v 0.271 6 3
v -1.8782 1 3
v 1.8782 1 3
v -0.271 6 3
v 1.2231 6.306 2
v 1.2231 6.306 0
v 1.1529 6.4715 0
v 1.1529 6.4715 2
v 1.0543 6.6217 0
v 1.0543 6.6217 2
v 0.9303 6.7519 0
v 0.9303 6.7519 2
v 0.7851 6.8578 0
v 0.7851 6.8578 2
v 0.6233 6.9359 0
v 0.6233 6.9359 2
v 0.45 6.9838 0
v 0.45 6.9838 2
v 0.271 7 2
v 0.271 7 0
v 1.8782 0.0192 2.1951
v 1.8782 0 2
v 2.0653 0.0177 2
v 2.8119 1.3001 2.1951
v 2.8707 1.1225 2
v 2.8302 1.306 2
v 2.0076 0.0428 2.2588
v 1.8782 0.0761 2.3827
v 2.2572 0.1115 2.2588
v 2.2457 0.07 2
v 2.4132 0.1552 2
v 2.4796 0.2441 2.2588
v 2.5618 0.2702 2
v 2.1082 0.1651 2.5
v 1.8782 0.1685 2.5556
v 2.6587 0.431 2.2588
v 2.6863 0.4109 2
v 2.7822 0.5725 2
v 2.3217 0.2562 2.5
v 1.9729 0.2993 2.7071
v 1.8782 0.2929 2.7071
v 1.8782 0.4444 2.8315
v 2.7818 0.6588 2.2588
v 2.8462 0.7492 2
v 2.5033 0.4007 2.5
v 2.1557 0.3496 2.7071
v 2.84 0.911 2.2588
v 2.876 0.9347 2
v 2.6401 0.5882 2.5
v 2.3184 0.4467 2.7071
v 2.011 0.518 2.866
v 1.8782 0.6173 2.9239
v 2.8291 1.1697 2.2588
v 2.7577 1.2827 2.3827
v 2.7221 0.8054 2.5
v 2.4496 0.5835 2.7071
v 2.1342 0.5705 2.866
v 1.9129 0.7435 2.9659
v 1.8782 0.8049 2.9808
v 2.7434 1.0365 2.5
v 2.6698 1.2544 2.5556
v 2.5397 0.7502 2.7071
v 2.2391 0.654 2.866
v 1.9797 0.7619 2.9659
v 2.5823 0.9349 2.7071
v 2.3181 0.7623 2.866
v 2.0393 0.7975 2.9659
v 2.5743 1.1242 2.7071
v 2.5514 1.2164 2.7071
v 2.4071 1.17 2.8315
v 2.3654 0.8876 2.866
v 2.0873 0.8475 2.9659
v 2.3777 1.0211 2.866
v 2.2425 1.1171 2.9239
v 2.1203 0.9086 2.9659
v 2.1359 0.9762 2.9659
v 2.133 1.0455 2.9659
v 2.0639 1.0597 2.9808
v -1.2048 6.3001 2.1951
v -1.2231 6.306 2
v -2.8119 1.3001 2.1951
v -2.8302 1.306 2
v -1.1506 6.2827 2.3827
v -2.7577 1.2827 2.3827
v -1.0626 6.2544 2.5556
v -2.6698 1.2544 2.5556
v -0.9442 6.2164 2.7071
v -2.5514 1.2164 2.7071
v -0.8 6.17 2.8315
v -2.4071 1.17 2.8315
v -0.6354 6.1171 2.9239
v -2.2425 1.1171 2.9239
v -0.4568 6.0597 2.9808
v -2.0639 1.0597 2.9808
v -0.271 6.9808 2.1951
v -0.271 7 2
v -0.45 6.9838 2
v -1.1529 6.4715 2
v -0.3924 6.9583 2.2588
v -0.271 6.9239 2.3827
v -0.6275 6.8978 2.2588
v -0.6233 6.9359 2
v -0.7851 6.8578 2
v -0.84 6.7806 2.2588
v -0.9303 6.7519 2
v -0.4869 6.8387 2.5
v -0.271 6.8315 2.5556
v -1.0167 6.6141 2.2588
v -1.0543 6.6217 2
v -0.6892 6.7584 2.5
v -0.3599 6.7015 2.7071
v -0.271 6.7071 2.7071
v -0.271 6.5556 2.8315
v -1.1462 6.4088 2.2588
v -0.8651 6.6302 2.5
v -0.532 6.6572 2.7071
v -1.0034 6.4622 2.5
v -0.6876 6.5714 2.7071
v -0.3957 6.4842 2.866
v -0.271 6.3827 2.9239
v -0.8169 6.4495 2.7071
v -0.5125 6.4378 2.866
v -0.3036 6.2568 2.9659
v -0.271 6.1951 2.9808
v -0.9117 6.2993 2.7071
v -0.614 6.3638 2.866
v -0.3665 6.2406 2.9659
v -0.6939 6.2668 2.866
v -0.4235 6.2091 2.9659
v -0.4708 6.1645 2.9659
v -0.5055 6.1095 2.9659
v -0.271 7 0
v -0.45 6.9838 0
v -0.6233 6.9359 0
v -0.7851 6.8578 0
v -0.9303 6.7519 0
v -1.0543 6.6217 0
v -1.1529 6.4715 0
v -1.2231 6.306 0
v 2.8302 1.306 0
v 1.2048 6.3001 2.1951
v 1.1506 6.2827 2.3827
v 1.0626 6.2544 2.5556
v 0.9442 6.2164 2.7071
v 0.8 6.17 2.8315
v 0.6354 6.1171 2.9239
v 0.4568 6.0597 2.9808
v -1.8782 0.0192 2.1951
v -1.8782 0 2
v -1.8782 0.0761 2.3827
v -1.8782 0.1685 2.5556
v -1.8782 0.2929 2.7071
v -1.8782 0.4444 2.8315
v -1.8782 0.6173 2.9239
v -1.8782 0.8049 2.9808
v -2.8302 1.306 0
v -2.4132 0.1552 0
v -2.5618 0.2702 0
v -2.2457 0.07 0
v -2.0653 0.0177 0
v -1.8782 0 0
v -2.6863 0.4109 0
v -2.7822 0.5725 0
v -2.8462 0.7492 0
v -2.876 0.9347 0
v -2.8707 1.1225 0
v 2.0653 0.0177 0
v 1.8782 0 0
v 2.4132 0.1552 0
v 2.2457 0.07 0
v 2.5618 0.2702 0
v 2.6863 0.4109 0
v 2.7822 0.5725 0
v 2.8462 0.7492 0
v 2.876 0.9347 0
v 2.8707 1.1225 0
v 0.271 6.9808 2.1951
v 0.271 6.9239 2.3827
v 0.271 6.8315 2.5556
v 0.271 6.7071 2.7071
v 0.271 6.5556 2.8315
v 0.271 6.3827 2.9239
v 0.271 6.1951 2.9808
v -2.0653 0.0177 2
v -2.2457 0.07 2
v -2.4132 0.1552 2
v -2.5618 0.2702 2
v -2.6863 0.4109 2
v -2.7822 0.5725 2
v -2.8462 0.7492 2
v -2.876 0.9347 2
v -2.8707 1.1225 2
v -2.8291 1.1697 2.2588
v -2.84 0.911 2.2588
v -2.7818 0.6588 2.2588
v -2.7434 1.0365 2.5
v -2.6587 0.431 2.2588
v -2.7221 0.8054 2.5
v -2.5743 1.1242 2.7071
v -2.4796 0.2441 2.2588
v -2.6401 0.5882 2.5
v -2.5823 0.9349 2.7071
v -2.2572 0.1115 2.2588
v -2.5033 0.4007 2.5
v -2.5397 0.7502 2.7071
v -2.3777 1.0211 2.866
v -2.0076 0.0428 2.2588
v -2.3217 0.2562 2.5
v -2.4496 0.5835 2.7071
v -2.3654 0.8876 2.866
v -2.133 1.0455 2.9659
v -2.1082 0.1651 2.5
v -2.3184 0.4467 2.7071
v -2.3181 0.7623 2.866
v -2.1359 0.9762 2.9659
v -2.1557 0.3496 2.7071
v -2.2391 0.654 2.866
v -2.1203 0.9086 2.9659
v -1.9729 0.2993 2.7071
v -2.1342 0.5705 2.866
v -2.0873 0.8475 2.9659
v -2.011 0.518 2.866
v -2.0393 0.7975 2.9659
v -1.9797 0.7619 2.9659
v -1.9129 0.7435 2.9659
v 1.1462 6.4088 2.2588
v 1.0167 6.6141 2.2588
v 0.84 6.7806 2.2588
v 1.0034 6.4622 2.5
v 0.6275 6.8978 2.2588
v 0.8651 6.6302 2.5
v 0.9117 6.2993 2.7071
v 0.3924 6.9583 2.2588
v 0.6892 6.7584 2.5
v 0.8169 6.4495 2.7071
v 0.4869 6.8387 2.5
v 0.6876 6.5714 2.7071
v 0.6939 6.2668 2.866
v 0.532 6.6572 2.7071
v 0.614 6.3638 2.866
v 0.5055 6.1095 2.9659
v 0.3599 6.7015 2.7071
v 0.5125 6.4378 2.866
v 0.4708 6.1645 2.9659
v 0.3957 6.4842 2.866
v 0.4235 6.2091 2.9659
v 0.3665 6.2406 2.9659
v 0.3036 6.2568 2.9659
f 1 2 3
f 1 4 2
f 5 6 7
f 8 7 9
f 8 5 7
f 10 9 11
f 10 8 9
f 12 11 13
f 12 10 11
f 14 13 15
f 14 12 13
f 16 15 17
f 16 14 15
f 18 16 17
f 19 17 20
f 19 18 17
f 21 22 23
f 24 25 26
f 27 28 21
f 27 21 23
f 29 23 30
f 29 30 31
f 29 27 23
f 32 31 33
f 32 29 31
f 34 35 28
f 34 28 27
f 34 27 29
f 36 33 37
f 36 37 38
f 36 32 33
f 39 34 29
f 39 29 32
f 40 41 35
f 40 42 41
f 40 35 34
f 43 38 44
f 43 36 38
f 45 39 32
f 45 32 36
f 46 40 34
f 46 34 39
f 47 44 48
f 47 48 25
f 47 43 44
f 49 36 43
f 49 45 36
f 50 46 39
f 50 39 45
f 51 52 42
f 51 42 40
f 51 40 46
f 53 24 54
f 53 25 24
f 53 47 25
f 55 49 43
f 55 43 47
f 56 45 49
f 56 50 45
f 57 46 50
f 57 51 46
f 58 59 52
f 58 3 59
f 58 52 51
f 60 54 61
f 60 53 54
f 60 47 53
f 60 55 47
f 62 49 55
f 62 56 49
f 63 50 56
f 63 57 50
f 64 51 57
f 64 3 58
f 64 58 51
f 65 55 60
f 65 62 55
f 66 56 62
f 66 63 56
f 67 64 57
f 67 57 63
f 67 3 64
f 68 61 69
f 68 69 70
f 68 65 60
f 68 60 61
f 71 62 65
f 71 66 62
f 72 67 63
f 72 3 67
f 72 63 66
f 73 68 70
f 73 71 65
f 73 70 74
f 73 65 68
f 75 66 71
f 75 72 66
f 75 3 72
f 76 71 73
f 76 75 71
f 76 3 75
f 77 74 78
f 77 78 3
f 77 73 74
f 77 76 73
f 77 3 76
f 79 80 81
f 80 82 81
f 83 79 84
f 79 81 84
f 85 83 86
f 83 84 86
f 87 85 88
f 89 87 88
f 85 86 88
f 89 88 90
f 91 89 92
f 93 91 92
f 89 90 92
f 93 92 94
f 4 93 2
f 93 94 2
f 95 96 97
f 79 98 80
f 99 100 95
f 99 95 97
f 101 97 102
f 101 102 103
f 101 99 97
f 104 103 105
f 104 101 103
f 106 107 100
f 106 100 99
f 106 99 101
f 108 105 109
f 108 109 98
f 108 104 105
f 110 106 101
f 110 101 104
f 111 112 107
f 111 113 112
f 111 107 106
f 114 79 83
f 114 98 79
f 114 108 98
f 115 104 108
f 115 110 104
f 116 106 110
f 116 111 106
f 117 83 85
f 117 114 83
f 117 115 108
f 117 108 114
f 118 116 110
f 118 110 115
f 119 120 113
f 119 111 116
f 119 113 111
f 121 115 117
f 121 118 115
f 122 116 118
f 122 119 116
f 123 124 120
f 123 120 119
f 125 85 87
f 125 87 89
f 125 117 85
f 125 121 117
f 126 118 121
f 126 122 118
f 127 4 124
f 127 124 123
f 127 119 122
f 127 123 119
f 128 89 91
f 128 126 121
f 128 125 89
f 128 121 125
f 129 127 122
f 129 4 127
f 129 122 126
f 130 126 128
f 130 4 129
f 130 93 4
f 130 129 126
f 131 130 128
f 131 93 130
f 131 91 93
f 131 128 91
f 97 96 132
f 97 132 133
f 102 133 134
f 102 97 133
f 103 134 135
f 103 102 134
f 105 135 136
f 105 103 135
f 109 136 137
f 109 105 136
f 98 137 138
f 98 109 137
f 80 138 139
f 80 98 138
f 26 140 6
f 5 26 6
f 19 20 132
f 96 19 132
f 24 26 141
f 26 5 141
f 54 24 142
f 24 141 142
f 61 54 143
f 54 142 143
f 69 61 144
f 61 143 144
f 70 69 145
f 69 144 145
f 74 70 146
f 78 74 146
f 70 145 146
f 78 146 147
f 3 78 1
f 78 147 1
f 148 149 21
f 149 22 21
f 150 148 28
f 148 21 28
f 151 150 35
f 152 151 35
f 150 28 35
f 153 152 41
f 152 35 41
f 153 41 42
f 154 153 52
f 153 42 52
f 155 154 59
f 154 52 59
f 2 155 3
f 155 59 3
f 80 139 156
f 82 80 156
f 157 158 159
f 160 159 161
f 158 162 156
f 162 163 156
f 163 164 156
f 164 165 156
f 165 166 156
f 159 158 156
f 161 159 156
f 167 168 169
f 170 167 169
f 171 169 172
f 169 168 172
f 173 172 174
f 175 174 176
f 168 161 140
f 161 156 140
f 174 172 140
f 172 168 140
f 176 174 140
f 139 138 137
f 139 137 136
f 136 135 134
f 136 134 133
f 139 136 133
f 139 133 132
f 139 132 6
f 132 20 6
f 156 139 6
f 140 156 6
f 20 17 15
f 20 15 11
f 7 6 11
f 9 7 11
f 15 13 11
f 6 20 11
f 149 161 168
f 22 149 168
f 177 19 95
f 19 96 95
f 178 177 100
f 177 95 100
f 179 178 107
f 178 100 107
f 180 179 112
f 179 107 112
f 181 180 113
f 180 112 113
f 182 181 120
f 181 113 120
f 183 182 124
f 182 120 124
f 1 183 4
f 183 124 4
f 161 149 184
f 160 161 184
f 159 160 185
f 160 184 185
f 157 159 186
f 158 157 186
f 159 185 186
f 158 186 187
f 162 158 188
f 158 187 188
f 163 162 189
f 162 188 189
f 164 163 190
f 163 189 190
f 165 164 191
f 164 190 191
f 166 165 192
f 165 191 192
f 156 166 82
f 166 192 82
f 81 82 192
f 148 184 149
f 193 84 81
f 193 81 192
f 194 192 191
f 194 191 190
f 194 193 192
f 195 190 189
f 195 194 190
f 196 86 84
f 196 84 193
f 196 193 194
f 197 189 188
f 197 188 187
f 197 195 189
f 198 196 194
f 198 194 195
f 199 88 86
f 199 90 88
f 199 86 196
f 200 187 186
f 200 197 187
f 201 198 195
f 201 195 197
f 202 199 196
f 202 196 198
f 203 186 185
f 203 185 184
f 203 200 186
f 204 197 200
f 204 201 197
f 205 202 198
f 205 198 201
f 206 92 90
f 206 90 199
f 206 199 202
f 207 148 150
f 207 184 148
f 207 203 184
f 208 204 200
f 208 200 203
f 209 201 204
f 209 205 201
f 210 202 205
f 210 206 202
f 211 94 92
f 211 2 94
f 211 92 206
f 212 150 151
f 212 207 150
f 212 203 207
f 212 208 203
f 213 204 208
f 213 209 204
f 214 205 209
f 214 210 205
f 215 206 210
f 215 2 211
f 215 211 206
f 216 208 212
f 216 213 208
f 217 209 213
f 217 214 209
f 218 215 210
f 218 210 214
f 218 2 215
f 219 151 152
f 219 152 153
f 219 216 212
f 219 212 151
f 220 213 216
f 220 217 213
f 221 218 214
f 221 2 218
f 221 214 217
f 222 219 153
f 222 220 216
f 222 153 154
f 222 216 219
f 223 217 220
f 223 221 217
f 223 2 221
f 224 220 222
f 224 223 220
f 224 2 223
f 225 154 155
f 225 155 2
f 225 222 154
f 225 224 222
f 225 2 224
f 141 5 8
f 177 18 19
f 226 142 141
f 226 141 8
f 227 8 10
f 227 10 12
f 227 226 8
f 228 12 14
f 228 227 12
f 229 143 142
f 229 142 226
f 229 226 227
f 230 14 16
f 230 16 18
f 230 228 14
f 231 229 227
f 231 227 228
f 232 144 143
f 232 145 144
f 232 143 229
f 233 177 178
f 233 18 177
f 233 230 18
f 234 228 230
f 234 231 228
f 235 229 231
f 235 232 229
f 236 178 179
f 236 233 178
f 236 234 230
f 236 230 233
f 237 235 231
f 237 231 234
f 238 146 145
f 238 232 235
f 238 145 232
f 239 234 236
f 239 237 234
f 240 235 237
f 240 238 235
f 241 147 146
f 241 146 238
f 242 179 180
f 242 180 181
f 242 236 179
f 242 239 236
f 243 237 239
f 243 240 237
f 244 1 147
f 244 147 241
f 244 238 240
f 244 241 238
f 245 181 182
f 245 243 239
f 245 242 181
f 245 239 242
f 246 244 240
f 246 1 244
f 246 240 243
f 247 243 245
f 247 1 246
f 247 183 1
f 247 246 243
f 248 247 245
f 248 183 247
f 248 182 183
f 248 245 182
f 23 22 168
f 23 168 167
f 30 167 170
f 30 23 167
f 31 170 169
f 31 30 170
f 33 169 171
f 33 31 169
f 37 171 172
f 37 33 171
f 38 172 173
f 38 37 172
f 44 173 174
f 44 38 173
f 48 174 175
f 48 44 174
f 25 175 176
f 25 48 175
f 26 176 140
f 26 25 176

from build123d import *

# Parameters (mm, degrees)
PAD_DEPTH   = 3
FILLET_R    = 1
FILLET001_R = 1


with BuildPart() as part:
    # Sketch → Pad (new body)
    with BuildSketch(Plane.XY):
        Polygon((-3.25, 0), (3.25, 0), (1, 7), (-1, 7), align=None)
    extrude(amount=PAD_DEPTH)

    # Fillet
    fillet_edges = [part.edges().sort_by_distance(p)[0] for p in [
        (-3.25, 0, 1.5),
        (3.25, 0, 1.5),
        (1, 7, 1.5),
        (-1, 7, 1.5),
    ]]
    fillet(fillet_edges, radius=FILLET_R)

    # Fillet001
    fillet001_edges = [part.edges().sort_by_distance(p)[0] for p in [
        (0, 0, 3),
        (-2.68627, 0.410937, 3),
        (2.68627, 0.410937, 3),
        (-2.02664, 3.806009, 3),
        (2.02664, 3.806009, 3),
        (-0.860103, 6.808087, 3),
        (0.860103, 6.808087, 3),
        (0, 7, 3),
    ]]
    fillet(fillet001_edges, radius=FILLET001_R)


solid = part.part
